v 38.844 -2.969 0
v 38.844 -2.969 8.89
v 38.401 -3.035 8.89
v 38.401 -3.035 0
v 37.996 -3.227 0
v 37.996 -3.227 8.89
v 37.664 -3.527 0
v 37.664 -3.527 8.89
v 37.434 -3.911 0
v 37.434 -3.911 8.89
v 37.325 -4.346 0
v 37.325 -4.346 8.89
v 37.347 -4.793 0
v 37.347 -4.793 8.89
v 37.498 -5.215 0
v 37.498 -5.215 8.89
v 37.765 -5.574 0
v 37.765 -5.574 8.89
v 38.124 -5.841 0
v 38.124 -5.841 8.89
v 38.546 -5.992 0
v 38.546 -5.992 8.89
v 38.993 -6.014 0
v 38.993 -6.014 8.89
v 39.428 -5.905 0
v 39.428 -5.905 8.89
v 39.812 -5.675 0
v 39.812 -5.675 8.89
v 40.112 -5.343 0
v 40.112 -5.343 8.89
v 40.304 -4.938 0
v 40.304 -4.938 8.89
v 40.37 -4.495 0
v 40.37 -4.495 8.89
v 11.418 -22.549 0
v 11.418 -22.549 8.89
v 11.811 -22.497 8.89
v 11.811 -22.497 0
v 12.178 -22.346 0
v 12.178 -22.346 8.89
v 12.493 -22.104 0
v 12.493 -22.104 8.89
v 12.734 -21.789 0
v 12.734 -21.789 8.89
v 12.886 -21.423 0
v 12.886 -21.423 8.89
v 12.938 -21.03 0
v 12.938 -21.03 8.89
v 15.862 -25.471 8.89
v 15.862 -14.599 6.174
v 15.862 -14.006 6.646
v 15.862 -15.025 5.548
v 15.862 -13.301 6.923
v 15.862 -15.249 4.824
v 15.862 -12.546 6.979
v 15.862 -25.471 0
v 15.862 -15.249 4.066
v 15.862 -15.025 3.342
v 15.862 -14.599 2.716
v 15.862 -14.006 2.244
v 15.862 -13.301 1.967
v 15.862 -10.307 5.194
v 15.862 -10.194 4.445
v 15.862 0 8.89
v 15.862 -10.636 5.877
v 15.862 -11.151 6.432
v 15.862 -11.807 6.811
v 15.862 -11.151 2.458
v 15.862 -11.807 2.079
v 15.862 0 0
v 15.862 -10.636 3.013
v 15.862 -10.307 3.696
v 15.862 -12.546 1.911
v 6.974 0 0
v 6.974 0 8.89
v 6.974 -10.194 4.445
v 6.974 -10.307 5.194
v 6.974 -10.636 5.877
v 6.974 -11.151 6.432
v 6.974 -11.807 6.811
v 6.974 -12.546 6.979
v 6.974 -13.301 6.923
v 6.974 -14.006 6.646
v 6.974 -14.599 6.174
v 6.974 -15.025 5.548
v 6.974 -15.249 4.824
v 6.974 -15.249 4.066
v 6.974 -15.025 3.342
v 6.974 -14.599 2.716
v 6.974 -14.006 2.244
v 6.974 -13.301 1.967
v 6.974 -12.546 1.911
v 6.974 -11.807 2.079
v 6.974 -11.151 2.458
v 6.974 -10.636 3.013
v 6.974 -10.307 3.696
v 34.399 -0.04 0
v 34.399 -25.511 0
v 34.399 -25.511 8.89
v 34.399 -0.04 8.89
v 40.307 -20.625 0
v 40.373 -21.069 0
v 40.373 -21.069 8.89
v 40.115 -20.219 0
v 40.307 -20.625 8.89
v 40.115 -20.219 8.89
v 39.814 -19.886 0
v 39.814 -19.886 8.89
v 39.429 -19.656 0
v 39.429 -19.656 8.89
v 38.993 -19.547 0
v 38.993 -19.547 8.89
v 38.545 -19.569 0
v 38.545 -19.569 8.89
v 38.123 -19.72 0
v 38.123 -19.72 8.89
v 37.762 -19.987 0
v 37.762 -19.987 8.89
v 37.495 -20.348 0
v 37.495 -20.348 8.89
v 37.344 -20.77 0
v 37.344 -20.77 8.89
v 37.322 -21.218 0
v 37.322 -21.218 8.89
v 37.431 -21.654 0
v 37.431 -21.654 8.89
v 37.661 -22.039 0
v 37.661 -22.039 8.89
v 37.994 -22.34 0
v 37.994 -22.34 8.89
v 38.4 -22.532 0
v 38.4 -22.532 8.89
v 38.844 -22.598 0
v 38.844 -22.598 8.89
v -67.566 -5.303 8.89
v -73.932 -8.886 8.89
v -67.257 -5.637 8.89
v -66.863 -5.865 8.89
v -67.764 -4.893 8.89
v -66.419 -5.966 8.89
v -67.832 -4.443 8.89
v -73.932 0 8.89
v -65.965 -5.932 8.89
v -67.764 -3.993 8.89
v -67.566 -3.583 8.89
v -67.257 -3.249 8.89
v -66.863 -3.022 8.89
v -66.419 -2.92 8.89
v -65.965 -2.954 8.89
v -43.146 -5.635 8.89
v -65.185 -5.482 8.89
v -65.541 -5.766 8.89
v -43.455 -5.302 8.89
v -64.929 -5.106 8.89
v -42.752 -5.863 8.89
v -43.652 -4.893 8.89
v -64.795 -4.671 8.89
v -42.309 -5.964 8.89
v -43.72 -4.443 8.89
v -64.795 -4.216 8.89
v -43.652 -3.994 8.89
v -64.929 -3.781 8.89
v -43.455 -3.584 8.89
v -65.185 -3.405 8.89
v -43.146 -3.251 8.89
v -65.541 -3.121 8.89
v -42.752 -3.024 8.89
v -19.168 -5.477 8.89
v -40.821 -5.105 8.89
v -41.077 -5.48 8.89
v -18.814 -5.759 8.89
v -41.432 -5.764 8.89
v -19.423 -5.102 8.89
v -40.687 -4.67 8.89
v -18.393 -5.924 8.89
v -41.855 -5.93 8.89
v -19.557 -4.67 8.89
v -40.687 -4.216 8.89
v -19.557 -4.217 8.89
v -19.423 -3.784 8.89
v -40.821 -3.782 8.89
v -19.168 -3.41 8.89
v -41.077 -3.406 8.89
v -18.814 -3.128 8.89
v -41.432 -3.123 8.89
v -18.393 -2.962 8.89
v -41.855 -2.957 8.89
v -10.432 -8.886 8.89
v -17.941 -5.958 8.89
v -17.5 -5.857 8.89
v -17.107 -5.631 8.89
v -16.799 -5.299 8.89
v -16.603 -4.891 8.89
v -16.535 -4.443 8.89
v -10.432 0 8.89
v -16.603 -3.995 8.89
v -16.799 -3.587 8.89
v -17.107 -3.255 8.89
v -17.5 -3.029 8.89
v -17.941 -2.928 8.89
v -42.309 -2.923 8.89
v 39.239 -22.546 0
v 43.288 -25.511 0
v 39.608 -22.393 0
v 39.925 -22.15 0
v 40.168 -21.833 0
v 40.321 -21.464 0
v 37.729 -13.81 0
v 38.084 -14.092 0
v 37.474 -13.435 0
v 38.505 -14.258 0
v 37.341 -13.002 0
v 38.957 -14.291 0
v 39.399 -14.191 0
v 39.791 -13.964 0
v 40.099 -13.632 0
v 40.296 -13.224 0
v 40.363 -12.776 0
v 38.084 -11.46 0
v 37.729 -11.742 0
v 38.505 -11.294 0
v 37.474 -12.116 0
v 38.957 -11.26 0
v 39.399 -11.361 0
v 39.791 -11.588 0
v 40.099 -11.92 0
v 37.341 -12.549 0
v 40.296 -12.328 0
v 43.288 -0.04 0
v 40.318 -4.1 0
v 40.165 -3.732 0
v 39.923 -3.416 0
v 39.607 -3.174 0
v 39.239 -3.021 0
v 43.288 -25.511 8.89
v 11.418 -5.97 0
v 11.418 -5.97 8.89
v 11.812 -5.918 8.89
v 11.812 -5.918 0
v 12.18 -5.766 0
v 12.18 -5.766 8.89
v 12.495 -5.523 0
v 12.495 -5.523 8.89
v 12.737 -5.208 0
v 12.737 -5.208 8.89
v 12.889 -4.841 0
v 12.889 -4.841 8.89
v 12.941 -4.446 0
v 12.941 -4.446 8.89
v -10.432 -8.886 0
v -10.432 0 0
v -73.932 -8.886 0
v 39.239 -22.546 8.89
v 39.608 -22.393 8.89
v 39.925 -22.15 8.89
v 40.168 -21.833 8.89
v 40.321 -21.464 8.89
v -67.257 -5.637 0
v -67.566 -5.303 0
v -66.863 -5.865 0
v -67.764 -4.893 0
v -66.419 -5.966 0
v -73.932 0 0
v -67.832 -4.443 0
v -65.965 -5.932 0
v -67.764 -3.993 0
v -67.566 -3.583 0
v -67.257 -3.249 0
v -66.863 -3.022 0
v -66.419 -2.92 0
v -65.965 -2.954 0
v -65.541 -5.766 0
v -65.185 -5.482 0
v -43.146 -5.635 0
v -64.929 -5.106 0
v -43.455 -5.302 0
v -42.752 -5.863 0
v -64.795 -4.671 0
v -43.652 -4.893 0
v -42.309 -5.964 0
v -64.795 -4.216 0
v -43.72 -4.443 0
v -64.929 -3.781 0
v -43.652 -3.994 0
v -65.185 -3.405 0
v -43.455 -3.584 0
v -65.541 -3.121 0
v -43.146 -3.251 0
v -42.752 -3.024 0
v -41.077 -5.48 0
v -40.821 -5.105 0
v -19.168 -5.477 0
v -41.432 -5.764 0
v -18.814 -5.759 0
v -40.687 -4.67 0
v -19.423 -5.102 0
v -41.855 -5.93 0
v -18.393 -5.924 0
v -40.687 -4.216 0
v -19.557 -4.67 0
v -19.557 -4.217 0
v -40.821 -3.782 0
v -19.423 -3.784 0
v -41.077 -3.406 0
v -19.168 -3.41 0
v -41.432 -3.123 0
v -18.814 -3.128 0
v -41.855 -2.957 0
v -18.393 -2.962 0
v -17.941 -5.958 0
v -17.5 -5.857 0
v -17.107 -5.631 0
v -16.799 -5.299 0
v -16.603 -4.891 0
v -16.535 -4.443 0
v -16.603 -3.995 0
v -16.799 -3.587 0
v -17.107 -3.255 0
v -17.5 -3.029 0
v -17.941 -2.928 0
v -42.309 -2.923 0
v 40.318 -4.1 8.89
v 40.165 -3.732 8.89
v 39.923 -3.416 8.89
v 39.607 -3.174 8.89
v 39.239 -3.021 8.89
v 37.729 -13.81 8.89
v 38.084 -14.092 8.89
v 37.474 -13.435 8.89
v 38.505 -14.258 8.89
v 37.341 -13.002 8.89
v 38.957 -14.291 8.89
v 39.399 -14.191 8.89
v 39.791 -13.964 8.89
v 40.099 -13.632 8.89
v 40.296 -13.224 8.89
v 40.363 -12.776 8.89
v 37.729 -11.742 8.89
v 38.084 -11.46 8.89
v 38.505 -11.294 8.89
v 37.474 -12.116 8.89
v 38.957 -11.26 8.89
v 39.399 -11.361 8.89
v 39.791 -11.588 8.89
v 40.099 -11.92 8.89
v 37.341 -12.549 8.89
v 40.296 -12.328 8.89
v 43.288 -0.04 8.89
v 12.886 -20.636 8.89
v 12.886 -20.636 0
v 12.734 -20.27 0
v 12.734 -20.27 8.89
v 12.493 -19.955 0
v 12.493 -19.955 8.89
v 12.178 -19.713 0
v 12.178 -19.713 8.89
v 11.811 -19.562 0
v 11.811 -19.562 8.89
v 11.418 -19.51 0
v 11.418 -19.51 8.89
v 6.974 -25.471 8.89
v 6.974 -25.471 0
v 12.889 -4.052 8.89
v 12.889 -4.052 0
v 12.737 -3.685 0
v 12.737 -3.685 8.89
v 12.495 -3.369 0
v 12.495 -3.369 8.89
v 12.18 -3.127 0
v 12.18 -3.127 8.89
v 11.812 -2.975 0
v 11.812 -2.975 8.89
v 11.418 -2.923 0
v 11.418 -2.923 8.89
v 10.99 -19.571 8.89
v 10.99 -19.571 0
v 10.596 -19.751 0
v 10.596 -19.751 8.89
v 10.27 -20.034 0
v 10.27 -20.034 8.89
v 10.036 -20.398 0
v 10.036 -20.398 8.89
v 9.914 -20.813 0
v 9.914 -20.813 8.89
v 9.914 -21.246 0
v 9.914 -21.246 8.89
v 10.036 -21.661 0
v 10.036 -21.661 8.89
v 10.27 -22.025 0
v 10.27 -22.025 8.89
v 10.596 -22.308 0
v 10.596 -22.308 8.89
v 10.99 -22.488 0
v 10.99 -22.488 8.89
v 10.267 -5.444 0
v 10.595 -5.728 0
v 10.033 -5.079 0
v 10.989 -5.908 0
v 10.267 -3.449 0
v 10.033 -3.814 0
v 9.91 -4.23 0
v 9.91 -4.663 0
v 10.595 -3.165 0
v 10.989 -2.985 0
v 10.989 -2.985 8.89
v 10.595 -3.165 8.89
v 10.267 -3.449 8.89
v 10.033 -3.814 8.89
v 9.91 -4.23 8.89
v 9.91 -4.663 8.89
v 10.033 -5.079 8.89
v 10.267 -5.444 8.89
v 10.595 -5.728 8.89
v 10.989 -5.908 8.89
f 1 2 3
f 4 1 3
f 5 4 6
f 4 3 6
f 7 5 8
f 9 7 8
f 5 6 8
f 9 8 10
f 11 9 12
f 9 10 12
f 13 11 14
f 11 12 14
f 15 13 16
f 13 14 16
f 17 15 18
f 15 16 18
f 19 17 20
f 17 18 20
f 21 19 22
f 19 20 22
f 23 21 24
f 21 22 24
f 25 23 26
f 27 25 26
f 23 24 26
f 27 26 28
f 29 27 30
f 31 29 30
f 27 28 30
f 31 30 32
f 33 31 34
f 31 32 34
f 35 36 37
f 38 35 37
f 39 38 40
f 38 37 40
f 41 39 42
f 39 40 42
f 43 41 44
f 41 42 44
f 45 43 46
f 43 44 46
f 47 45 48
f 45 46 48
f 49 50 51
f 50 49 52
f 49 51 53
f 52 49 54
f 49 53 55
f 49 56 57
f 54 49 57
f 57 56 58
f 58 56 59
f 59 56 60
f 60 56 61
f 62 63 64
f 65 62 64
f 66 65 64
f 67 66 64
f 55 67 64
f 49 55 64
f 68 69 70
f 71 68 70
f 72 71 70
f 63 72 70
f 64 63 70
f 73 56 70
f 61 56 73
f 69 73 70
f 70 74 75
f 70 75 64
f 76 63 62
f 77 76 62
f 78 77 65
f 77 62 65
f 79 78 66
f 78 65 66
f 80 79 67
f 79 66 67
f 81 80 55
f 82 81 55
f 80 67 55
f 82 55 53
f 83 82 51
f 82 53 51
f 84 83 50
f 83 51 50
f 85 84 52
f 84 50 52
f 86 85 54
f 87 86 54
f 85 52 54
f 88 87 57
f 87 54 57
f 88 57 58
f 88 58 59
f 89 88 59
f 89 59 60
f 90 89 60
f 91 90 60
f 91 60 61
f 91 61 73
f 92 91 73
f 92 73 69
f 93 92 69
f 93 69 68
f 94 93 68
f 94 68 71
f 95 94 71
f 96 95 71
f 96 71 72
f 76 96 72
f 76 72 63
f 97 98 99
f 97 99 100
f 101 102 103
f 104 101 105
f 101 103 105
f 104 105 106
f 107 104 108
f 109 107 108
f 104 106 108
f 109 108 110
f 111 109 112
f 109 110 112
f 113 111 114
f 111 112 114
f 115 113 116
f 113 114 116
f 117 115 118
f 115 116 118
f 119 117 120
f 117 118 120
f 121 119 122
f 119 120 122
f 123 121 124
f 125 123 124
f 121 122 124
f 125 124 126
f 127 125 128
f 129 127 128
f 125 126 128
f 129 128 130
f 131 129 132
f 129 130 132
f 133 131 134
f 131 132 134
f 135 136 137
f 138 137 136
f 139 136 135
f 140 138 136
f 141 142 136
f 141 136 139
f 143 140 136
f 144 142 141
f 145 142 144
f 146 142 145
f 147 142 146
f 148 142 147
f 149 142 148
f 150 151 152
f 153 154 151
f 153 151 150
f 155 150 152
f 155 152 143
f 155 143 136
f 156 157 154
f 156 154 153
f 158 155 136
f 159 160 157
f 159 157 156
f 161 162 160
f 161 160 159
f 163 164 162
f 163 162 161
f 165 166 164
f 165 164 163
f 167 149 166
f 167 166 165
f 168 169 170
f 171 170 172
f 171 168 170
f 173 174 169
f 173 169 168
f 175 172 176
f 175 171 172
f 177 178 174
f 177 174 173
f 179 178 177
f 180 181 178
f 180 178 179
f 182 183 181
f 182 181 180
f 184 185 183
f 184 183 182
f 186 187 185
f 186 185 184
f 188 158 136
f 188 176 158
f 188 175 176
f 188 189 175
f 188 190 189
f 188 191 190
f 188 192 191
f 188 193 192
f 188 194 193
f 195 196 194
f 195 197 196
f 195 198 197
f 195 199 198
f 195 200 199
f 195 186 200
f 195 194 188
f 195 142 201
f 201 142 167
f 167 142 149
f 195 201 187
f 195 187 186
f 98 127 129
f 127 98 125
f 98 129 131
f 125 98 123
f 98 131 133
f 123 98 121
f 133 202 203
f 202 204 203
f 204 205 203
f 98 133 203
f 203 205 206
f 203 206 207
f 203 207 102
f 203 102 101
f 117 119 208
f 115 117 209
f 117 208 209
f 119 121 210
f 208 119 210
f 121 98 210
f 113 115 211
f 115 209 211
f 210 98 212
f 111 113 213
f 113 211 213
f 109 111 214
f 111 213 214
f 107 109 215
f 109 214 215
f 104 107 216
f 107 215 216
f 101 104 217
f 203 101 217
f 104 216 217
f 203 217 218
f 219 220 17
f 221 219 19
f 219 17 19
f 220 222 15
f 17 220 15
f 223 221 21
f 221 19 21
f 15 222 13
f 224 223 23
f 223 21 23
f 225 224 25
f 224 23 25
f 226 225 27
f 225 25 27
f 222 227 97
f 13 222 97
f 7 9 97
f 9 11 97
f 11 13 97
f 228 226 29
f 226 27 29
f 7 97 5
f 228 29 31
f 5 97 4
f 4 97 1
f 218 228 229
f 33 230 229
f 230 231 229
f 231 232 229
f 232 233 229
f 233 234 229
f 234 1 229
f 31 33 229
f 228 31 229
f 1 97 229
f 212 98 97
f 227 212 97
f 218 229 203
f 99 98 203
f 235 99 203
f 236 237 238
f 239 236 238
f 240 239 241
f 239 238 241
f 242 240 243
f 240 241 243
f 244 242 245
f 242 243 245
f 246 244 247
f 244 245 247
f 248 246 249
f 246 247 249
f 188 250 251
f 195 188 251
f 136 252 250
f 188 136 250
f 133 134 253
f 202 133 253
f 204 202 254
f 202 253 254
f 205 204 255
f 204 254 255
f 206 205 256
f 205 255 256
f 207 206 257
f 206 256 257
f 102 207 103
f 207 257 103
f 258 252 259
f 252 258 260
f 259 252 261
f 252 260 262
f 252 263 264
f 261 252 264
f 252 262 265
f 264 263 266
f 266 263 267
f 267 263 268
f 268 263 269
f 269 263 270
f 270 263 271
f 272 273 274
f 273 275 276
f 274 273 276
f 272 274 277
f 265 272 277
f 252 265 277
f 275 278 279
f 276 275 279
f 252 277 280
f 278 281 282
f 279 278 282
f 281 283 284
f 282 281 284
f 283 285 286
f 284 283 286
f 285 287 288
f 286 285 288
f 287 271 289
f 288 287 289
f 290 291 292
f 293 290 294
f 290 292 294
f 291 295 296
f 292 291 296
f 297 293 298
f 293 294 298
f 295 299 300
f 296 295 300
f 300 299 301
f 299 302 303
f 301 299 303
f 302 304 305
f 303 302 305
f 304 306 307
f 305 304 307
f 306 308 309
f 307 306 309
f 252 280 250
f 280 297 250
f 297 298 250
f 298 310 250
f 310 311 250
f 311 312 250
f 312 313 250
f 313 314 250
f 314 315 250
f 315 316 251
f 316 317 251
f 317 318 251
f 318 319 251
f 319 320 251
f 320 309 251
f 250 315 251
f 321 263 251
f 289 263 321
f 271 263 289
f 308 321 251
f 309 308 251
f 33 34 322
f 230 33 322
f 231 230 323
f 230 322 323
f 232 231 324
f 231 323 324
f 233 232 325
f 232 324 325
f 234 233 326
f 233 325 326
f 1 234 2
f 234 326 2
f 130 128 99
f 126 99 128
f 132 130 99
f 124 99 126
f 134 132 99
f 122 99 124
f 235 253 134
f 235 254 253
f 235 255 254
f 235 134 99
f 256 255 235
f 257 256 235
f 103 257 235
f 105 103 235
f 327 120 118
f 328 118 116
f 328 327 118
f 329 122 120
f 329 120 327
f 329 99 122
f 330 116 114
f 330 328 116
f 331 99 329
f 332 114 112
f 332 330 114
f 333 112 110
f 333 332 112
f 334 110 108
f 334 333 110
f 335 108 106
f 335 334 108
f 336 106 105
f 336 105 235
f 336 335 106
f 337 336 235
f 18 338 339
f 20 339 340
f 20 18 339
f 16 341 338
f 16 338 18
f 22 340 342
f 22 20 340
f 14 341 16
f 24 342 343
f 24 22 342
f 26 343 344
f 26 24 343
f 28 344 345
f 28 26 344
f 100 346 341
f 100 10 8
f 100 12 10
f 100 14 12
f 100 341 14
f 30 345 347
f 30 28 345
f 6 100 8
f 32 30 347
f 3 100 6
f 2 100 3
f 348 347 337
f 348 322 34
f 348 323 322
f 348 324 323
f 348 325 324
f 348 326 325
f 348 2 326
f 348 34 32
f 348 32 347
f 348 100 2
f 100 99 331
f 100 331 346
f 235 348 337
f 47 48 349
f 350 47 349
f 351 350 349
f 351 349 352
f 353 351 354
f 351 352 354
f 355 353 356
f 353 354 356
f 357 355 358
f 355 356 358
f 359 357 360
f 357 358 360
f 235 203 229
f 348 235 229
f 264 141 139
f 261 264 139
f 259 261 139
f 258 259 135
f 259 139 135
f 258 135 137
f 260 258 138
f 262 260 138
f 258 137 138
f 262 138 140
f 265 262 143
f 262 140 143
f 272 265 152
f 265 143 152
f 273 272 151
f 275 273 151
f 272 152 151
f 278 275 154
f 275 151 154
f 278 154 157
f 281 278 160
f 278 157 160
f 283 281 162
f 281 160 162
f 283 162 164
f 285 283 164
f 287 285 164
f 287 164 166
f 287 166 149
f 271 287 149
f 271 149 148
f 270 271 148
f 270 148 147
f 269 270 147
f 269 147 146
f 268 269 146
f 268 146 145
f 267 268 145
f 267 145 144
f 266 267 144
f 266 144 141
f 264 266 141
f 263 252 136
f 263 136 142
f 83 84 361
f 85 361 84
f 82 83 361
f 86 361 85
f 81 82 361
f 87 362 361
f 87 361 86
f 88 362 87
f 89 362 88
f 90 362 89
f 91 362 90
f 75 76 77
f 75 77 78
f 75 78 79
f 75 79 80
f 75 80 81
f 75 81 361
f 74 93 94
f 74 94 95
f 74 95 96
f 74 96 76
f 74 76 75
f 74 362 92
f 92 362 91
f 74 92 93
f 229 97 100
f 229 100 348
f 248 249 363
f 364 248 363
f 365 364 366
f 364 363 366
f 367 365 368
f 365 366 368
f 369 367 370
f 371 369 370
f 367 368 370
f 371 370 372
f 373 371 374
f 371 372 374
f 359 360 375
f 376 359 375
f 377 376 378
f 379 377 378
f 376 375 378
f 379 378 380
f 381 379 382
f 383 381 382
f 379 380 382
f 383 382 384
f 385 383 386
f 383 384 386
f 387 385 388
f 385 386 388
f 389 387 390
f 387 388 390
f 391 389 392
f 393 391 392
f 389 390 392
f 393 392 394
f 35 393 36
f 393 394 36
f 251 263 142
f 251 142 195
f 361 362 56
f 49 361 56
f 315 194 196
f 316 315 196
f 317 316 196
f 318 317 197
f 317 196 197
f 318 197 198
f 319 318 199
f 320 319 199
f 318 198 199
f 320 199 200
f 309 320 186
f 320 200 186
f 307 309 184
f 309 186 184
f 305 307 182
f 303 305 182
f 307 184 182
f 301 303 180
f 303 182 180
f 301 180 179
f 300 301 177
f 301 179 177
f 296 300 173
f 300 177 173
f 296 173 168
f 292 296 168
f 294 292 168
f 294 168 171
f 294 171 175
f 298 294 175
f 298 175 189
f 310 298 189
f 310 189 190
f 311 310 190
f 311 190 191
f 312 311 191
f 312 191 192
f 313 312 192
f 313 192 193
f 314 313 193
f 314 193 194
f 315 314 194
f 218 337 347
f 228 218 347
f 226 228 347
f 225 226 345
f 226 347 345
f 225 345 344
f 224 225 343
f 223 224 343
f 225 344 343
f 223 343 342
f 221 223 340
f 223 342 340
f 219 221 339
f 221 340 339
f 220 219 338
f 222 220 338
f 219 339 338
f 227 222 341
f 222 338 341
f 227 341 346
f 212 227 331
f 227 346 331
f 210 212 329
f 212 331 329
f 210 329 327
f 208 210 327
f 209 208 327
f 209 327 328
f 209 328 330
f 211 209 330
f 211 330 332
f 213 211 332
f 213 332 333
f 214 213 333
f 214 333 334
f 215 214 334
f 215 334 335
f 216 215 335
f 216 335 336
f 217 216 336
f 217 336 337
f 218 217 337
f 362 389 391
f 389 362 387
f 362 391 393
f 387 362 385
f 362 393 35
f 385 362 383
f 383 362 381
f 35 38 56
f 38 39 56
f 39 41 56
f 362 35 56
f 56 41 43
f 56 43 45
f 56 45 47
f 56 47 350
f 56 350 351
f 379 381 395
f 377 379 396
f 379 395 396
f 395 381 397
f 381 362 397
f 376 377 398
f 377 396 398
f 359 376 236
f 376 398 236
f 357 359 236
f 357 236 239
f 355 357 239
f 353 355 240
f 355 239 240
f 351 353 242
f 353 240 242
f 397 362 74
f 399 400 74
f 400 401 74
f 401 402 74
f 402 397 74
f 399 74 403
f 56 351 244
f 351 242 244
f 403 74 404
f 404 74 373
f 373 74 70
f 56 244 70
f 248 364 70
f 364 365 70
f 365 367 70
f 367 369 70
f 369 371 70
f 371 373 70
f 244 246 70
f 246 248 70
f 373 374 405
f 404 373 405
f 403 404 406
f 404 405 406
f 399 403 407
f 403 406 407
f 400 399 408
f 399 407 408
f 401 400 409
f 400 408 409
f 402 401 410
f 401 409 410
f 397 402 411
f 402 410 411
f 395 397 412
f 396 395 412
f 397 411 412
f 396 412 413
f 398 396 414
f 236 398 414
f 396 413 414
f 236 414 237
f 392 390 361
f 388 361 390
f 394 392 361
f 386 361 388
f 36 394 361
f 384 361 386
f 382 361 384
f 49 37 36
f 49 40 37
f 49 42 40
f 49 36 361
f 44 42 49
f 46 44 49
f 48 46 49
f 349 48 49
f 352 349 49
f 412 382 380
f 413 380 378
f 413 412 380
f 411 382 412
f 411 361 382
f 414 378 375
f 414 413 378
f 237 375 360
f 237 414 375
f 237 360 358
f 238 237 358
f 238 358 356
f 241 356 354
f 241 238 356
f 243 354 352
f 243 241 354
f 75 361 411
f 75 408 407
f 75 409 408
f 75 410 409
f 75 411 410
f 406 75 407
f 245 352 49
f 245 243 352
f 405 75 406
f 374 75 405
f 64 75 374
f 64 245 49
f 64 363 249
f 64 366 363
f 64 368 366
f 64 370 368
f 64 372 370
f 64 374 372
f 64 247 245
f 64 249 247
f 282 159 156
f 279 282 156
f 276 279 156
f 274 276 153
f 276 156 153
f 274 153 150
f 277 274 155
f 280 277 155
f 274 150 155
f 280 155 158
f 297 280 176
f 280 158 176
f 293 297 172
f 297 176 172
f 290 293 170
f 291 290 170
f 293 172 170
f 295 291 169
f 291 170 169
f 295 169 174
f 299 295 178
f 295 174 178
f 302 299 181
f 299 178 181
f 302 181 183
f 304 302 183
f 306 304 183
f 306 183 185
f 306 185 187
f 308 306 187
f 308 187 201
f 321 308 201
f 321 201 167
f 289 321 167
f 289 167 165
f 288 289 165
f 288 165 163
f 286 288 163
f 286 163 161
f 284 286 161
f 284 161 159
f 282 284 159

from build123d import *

# Parameters (mm, degrees)
F0_W      = 63.4998399764
F0_H      = 8.8863964193
F1_DEPTH  = 8.89
F4_W      = 8.8887698962
F4_H      = 25.4709599787
F5_DEPTH  = 8.89
F7_DEPTH  = 12.7
F9_DEPTH  = 25.4
F10_W     = 8.8887698962
F10_H     = 25.4709599787
F11_DEPTH = 8.89
F2_R      = 1.5192022955
F13_DEPTH = 25.4
F14_DEPTH = 25.4
F12_R     = 1.5198546865
F15_DEPTH = 25.4


with BuildPart() as f1:
    # F0 (on Top) → F1 (new body)
    with BuildSketch(Plane.XY):
        with Locations((-42.182370089, -4.4431982096)):
            Rectangle(F0_W, F0_H)
    extrude(amount=F1_DEPTH)

    # F2 (on face) → F13 (cut)
    with BuildSketch(Plane.XY.offset(8.89)):
        with BuildLine():
            ThreePointArc((-64.7777148179, -4.4431982096), (-66.3047730923, -2.9161399353), (-67.8318313666, -4.4431982096))
            ThreePointArc((-67.8318313666, -4.4431982096), (-66.3047730923, -5.970256484), (-64.7777148179, -4.4431982096))
        make_face()
        with Locations((-18.0546771735, -4.4431982096)):
            Circle(F2_R)
    extrude(amount=-F13_DEPTH, mode=Mode.SUBTRACT)

    # F3 (on face) → F14 (cut)
    with BuildSketch(Plane.XY.offset(8.89)):
        with BuildLine():
            ThreePointArc((-40.6698822216, -4.4431982096), (-42.1947985888, -2.9182818425), (-43.7197149559, -4.4431982096))
            ThreePointArc((-43.7197149559, -4.4431982096), (-42.1947985888, -5.9681145768), (-40.6698822216, -4.4431982096))
        make_face()
    extrude(amount=-F14_DEPTH, mode=Mode.SUBTRACT)


with BuildPart() as f5:
    # F4 (on Top) → F5 (new body)
    with BuildSketch(Plane.XY):
        with Locations((11.4180715748, -12.7354799894)):
            Rectangle(F4_W, F4_H)
    extrude(amount=F5_DEPTH)

    # F6 (on face) → F7 (cut)
    with BuildSketch(Plane.XY.offset(8.89)):
        with BuildLine():
            ThreePointArc((11.4180715748, -19.5098076149), (9.8983402367, -21.029538953), (11.4180715748, -22.5492702911))
            Line((11.4180715748, -22.5492702911), (11.4180715748, -21.029538953))
            Line((11.4180715748, -21.029538953), (11.4180715748, -19.5098076149))
        make_face()
        with BuildLine():
            Line((11.4180715748, -21.029538953), (11.4180715748, -22.5492702911))
            ThreePointArc((11.4180715748, -22.5492702911), (12.4926839095, -22.1041512878), (12.9378029129, -21.029538953))
            ThreePointArc((12.9378029129, -21.029538953), (12.4926839095, -19.9549266183), (11.4180715748, -19.5098076149))
            Line((11.4180715748, -19.5098076149), (11.4180715748, -21.029538953))
        make_face()
        with BuildLine():
            Line((11.4180715748, -4.4464189559), (11.4180715748, -2.9232586077))
            ThreePointArc((11.4180715748, -2.9232586077), (9.8949112265, -4.4464189559), (11.4180715748, -5.9695793042))
            Line((11.4180715748, -5.9695793042), (11.4180715748, -4.4464189559))
        make_face()
        with BuildLine():
            ThreePointArc((12.941231923, -4.4464189559), (12.4951085859, -3.3693819448), (11.4180715748, -2.9232586077))
            Line((11.4180715748, -2.9232586077), (11.4180715748, -4.4464189559))
            Line((11.4180715748, -4.4464189559), (11.4180715748, -5.9695793042))
            ThreePointArc((11.4180715748, -5.9695793042), (12.4951085859, -5.523455967), (12.941231923, -4.4464189559))
        make_face()
    extrude(amount=-F7_DEPTH, mode=Mode.SUBTRACT)

    # F8 (on face) → F9 (cut)
    with BuildSketch(Plane.YZ.offset(15.8624565229)):
        with BuildLine():
            Line((-10.1939541947, 4.445), (-12.7354799894, 4.445))
            Line((-12.7354799894, 4.445), (-15.2770057841, 4.445))
            ThreePointArc((-15.2770057841, 4.445), (-12.7354799894, 1.9034742053), (-10.1939541947, 4.445))
        make_face()
        with BuildLine():
            Line((-15.2770057841, 4.445), (-12.7354799894, 4.445))
            Line((-12.7354799894, 4.445), (-10.1939541947, 4.445))
            ThreePointArc((-10.1939541947, 4.445), (-12.7354799894, 6.9865257947), (-15.2770057841, 4.445))
        make_face()
    extrude(amount=-F9_DEPTH, mode=Mode.SUBTRACT)


with BuildPart() as f11:
    # F10 (on Top) → F11 (new body)
    with BuildSketch(Plane.XY):
        with Locations((38.8435609639, -12.7757902956)):
            Rectangle(F10_W, F10_H)
    extrude(amount=F11_DEPTH)

    # F12 (on face) → F15 (cut)
    with BuildSketch(Plane.XY.offset(8.89)):
        with BuildLine():
            ThreePointArc((40.3729472389, -21.0685674101), (37.7621215578, -19.987128004), (38.8435609639, -22.5979536851))
            ThreePointArc((38.8435609639, -22.5979536851), (39.92500037, -22.1500068162), (40.3729472389, -21.0685674101))
        make_face()
        with Locations((38.8435609639, -12.7757902956)):
            Circle(F12_R)
        with BuildLine():
            ThreePointArc((40.3695379503, -4.4953571633), (39.9225896389, -3.4163284882), (38.8435609639, -2.9693801768))
            ThreePointArc((38.8435609639, -2.9693801768), (37.7645322888, -5.5743858383), (40.3695379503, -4.4953571633))
        make_face()
    extrude(amount=-F15_DEPTH, mode=Mode.SUBTRACT)


solid = Compound([f1.part, f5.part, f11.part])
